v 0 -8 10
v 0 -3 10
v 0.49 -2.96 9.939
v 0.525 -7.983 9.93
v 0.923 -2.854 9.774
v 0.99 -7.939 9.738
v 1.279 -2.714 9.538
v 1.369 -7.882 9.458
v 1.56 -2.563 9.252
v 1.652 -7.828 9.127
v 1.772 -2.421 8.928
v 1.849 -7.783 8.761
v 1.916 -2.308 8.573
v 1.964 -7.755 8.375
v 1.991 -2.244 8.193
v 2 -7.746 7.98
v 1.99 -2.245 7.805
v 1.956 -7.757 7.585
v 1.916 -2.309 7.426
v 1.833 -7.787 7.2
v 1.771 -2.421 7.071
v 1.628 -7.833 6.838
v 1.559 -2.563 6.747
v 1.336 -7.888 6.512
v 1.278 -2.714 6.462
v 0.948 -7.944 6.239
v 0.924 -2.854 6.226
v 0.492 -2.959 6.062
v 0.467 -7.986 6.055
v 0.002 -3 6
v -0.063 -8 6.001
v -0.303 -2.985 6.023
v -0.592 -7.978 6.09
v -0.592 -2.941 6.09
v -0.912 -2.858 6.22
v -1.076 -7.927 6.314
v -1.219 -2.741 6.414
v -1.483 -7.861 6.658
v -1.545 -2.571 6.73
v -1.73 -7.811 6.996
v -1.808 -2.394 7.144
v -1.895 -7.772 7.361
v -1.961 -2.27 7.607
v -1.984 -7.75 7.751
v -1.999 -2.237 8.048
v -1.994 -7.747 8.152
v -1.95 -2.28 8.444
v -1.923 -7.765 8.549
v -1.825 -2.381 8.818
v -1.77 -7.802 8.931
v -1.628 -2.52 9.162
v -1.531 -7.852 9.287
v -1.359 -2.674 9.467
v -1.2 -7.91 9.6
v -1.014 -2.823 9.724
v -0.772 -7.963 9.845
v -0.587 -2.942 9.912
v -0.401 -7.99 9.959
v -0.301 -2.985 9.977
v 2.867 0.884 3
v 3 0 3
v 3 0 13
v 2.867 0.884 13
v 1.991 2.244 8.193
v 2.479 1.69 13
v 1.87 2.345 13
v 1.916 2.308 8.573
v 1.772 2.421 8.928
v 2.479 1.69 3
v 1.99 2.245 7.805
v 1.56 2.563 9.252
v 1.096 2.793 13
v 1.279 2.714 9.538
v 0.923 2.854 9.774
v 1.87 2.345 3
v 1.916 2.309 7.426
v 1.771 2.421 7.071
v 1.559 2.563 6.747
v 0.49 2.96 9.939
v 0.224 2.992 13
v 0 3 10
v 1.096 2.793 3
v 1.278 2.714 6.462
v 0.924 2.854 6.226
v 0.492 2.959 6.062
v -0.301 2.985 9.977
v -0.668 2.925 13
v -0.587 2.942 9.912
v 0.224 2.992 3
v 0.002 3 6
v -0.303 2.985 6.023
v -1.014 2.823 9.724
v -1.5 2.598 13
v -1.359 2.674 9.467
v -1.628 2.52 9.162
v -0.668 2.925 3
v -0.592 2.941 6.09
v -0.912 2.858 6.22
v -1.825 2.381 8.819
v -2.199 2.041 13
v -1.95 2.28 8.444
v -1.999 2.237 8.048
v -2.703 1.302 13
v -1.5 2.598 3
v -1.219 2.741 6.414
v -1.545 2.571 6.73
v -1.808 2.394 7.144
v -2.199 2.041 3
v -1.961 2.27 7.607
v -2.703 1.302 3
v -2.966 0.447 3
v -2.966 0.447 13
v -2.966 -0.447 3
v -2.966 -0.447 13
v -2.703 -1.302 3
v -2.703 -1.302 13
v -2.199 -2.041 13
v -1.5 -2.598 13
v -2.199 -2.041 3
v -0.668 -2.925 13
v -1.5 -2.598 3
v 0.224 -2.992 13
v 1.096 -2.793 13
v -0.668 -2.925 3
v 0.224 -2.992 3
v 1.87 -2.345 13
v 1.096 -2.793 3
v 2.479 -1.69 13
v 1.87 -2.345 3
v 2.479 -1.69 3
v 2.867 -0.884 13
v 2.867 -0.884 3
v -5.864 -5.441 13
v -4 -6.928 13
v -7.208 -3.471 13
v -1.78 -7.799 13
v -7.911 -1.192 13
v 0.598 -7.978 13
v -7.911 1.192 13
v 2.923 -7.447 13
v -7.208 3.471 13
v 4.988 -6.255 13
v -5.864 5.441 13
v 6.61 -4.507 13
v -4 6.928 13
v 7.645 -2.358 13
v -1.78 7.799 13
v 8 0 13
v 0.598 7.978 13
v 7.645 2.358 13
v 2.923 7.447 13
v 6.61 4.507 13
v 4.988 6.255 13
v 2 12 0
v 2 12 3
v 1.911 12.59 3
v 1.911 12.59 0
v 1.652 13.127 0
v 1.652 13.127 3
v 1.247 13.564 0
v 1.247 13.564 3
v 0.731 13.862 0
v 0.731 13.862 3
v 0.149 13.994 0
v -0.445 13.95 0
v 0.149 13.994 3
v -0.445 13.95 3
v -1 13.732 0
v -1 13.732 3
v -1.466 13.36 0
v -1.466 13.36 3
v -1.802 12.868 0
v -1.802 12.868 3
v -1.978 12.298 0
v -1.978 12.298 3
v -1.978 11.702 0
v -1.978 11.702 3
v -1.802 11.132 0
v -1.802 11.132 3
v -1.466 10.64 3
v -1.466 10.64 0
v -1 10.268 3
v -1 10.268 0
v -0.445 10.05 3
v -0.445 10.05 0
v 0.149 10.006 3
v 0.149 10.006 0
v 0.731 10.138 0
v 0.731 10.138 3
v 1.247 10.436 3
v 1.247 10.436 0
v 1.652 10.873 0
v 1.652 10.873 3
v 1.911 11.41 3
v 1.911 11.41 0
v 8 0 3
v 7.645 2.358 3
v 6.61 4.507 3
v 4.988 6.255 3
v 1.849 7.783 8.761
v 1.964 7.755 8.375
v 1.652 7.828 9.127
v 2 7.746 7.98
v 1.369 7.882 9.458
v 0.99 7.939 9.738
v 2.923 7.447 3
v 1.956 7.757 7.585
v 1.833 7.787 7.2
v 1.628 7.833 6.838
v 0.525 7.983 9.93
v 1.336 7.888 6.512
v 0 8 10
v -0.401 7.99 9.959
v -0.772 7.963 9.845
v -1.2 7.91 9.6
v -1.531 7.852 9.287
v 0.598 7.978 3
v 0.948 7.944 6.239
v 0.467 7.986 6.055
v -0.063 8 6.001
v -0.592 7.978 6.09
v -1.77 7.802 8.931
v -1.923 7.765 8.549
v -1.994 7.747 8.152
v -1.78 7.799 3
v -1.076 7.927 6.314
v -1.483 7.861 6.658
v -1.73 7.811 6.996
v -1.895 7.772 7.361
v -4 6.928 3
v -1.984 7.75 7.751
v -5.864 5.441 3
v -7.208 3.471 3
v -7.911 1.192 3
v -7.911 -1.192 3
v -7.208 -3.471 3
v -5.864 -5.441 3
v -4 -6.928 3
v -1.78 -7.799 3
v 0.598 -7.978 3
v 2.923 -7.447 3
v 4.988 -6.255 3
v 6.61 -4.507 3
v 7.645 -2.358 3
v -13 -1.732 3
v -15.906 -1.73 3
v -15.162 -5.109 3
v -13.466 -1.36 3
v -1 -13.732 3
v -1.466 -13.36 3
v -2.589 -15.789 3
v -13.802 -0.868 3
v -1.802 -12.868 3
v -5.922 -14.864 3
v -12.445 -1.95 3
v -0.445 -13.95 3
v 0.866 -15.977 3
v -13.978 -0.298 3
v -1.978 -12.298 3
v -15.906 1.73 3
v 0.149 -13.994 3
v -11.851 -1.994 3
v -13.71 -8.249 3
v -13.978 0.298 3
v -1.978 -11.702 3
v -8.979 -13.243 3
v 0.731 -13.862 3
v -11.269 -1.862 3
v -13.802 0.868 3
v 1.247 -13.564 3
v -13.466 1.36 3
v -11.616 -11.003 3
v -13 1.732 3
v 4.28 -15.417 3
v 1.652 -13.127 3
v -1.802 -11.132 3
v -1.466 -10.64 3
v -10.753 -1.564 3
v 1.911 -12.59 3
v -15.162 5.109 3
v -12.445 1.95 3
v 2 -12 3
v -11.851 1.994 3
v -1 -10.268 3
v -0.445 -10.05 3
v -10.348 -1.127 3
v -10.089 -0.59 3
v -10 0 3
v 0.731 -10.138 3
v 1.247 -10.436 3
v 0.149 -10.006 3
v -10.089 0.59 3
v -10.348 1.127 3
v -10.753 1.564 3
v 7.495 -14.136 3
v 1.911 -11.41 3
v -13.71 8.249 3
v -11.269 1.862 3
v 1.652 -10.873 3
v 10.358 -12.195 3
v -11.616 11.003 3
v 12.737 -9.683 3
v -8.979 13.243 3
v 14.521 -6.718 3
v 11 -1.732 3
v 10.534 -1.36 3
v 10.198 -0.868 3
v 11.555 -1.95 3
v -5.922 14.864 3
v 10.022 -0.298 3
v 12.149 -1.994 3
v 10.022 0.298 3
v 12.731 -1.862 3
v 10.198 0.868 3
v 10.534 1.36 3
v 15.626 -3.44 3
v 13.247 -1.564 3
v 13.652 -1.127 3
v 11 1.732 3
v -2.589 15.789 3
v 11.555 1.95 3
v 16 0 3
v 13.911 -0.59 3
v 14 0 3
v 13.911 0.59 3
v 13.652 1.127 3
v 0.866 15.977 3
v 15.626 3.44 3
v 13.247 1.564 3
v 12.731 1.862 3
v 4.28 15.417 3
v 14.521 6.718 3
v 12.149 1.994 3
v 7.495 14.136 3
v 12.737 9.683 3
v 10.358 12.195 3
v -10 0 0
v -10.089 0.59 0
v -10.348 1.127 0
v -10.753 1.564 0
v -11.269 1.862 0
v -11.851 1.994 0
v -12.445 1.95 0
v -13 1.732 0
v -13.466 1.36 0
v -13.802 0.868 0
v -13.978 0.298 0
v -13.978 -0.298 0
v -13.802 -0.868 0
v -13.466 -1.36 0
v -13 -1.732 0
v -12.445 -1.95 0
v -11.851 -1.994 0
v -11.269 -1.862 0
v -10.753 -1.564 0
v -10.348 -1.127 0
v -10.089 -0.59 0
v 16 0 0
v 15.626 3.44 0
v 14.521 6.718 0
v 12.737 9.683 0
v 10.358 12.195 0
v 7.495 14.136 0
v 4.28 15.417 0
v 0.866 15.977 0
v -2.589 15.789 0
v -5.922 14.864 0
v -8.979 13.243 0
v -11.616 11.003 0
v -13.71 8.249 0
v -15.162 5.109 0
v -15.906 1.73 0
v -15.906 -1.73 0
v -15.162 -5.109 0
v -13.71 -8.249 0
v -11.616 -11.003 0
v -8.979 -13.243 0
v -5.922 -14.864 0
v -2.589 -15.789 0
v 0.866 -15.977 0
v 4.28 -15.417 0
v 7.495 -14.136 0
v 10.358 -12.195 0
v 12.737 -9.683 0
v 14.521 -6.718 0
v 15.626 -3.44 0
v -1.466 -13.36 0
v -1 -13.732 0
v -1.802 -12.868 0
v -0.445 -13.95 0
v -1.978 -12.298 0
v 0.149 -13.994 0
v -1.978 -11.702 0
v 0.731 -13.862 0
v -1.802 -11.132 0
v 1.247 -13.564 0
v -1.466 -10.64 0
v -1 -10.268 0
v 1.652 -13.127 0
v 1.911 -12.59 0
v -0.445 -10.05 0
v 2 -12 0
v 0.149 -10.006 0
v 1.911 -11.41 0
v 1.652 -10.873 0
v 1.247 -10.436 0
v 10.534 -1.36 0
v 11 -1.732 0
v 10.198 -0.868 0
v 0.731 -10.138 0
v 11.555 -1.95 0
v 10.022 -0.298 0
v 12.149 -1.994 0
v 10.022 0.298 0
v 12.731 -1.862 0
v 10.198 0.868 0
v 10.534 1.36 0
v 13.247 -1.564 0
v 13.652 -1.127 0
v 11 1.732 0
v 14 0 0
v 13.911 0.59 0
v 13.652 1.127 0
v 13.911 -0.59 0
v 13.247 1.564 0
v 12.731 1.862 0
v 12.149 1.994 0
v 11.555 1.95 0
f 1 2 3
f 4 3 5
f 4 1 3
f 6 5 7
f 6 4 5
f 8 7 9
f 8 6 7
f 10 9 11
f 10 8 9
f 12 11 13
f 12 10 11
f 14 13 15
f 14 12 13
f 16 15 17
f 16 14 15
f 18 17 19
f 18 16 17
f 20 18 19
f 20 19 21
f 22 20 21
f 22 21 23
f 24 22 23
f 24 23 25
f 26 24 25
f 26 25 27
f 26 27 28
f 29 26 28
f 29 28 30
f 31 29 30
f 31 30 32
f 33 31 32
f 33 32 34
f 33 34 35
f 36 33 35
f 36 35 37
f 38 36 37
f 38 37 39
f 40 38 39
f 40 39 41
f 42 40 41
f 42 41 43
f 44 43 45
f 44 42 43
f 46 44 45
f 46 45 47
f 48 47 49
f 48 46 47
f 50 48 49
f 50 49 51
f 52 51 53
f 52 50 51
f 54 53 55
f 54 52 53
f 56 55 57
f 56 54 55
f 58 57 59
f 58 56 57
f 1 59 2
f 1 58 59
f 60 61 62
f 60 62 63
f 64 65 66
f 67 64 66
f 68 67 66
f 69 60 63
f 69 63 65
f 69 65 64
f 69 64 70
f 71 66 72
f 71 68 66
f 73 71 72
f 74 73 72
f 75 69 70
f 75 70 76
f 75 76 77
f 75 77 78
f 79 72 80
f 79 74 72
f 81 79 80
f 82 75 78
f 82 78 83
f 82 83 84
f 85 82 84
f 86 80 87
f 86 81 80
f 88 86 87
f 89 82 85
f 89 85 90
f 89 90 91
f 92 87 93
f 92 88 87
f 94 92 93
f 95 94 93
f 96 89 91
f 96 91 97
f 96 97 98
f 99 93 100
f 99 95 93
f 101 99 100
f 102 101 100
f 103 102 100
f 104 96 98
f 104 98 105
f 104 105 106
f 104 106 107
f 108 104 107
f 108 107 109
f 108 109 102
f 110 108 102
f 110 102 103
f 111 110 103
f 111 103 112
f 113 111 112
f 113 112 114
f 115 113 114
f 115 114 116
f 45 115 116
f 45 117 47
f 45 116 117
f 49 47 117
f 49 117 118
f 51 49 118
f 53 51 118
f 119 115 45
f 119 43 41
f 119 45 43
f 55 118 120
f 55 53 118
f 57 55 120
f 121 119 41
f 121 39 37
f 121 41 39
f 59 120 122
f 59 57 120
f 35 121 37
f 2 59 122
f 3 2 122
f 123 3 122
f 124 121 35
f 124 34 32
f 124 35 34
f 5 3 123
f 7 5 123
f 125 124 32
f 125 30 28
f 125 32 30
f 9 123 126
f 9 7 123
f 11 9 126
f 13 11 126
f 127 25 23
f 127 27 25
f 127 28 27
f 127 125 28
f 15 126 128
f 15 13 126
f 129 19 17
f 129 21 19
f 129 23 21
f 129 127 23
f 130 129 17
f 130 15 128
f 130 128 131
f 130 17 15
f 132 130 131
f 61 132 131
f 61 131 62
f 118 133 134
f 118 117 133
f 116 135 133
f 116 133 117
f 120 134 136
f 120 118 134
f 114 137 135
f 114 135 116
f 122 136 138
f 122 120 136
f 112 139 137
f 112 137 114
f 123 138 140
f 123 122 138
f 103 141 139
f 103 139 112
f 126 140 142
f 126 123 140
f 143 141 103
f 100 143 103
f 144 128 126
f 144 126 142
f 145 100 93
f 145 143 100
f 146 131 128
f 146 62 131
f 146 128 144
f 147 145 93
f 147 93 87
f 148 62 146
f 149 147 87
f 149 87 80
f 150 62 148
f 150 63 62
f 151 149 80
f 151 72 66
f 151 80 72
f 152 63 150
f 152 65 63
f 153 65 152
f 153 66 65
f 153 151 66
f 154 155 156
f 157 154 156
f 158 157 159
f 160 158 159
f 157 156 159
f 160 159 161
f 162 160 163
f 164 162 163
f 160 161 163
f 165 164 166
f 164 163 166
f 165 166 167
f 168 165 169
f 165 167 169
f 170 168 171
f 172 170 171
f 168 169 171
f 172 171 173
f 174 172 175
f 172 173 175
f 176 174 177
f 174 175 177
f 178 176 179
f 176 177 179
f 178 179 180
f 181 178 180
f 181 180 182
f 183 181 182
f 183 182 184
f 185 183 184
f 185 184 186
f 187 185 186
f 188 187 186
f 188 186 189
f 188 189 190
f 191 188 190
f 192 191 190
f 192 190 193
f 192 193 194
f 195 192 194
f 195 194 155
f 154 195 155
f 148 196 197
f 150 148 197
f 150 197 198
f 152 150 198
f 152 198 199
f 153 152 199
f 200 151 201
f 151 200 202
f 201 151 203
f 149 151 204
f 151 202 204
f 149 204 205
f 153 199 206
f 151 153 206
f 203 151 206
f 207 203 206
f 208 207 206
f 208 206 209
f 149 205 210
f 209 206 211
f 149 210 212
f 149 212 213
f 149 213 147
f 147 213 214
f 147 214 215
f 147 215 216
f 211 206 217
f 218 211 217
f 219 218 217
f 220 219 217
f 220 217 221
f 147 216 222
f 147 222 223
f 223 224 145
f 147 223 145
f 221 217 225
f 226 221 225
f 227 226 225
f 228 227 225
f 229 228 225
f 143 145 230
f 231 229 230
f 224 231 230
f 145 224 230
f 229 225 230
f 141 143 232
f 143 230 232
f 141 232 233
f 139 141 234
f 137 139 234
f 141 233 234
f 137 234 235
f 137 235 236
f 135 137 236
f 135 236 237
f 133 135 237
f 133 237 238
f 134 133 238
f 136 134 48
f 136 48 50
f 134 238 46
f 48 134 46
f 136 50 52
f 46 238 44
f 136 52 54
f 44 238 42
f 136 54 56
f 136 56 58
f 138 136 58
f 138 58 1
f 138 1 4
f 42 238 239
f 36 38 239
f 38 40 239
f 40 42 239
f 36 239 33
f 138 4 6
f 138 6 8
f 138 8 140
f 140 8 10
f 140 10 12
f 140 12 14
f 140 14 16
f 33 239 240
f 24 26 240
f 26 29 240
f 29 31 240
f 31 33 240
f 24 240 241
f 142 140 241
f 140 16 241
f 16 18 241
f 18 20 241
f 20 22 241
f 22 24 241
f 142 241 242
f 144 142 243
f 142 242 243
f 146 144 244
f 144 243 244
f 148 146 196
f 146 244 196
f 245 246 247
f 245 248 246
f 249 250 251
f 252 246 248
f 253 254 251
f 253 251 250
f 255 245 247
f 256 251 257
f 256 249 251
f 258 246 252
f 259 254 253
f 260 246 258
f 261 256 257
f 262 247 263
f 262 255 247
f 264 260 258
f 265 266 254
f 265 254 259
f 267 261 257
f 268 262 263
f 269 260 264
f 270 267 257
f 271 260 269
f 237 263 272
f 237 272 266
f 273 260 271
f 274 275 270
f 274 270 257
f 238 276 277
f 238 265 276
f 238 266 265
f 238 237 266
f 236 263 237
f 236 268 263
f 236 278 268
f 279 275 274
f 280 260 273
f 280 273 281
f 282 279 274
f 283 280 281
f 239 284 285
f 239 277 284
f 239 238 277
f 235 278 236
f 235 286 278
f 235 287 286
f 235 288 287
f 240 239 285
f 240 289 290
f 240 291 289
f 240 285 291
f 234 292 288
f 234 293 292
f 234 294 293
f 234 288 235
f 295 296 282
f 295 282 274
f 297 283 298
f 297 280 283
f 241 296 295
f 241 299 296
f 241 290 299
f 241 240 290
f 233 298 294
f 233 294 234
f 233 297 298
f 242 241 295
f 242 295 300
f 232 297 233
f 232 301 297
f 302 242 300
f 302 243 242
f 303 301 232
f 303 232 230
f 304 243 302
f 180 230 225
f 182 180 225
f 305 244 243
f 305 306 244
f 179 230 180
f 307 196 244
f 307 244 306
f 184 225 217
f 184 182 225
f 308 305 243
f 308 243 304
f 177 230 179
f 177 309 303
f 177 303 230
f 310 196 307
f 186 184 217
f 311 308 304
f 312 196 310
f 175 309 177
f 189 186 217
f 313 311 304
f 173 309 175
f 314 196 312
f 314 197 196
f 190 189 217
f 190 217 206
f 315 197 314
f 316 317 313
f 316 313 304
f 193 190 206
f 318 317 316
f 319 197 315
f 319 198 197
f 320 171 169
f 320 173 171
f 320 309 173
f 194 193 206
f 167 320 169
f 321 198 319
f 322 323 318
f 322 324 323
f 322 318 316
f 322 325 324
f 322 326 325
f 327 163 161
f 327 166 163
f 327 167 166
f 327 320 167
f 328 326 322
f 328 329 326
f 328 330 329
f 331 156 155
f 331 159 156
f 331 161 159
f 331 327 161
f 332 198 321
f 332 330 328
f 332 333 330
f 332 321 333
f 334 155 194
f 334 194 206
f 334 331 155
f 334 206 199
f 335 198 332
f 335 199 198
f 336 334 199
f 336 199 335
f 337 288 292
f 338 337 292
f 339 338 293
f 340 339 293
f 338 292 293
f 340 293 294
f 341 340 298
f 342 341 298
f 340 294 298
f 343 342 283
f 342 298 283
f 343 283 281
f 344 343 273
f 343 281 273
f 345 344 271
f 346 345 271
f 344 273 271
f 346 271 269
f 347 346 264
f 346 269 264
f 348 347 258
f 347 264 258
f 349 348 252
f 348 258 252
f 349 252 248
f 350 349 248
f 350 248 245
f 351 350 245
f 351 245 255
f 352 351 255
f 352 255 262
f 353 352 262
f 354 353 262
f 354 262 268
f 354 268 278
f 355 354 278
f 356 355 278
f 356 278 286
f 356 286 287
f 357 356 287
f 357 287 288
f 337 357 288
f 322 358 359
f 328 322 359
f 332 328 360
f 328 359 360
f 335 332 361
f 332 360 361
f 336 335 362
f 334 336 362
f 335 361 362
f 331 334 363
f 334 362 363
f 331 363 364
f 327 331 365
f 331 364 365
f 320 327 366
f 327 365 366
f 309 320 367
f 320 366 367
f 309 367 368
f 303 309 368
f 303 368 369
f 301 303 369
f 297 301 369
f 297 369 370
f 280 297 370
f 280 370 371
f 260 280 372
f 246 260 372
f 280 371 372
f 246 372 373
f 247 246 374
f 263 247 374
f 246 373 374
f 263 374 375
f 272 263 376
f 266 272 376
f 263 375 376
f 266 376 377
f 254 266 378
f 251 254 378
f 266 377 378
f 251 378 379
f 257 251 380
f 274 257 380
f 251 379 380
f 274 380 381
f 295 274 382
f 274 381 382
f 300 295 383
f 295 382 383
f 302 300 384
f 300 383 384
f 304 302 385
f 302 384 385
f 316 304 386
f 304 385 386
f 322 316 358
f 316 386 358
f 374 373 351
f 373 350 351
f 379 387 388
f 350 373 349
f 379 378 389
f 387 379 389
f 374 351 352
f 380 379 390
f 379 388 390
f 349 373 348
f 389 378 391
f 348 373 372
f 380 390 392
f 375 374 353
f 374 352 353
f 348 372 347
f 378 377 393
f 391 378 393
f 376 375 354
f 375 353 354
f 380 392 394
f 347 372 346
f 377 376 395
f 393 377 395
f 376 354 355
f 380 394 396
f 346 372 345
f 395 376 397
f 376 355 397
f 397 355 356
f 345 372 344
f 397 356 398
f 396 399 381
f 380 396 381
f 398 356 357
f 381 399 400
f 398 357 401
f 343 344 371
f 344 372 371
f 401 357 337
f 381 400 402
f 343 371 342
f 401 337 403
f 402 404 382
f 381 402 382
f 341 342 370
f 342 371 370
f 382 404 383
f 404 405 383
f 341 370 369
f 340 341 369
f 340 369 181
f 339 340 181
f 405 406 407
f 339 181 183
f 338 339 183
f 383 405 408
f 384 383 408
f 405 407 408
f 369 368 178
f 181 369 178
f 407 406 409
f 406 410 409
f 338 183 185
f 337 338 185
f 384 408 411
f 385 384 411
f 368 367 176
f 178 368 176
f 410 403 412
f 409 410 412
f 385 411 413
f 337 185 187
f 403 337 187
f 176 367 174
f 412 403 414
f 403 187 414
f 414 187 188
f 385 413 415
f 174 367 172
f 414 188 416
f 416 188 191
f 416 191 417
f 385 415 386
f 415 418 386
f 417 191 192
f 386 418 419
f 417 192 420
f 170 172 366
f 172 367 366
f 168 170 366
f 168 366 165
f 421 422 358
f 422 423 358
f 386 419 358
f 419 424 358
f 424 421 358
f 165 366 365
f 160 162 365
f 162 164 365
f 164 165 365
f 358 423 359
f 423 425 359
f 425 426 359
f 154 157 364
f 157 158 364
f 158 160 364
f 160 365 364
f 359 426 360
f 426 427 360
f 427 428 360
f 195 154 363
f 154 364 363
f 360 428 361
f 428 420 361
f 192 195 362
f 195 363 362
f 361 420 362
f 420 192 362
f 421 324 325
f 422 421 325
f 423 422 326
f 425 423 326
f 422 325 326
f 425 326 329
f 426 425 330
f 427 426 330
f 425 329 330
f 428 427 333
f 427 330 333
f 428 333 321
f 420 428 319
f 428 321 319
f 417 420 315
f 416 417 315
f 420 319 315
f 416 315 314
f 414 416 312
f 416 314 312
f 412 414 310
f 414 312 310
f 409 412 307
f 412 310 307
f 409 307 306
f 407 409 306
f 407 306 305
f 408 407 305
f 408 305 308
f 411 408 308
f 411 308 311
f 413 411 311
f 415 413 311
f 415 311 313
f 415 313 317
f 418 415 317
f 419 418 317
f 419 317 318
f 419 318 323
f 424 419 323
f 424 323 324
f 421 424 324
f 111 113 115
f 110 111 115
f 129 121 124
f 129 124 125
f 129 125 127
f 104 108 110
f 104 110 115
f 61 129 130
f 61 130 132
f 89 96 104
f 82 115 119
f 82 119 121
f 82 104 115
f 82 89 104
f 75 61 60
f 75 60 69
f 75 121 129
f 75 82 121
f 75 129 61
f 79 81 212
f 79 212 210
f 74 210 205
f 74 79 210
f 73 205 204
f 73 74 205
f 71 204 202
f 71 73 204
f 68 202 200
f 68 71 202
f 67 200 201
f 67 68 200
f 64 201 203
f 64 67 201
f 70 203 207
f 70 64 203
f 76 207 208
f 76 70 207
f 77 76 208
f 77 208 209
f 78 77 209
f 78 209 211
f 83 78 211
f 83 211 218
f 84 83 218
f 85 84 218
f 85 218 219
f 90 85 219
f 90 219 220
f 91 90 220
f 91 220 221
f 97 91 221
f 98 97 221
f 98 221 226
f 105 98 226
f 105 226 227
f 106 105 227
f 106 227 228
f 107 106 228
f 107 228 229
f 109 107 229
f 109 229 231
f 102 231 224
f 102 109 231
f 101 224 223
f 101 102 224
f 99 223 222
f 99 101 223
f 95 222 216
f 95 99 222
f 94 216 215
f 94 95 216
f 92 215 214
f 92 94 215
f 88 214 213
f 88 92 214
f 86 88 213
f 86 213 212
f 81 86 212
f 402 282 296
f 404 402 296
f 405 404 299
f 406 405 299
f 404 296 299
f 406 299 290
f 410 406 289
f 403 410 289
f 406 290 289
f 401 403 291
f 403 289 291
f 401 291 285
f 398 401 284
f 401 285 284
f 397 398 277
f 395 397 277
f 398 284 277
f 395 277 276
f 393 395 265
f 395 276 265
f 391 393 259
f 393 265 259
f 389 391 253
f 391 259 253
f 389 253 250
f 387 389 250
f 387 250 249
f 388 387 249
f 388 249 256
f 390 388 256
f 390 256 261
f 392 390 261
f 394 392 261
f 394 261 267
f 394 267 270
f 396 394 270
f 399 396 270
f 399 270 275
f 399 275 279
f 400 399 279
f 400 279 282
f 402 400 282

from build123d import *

# Parameters (mm, degrees)
SKETCH1_R               = 16
BOSS_EXTRUDE1_DEPTH     = 3
SKETCH2_R               = 8
SKETCH2_R_2             = 3
BOSS_EXTRUDE2_DEPTH     = 10
SKETCH3_R               = 2
CUT_EXTRUDE1_DEPTH      = 25.738633754
CUT_EXTRUDE2_DEPTH      = 27.095976701
CUT_EXTRUDE2_DEPTH_BACK = 27.095976701
SKETCH4_R               = 2


with BuildPart() as part:
    # Sketch1 → Boss-Extrude1 (new body)
    with BuildSketch(Plane.XY):
        Circle(SKETCH1_R)
    extrude(amount=BOSS_EXTRUDE1_DEPTH)

    # Sketch2 → Boss-Extrude2 (add)
    with BuildSketch(Plane.XY.offset(3)):
        Circle(SKETCH2_R)
        Circle(SKETCH2_R_2, mode=Mode.SUBTRACT)
    extrude(amount=BOSS_EXTRUDE2_DEPTH)

    # Sketch3 → Cut-Extrude1 (cut, through all)
    with BuildSketch(Plane.XY.offset(3)):
        with Locations((0, 12)):
            Circle(SKETCH3_R)
        with Locations((12, 0)):
            Circle(SKETCH3_R)
        with Locations((0, -12)):
            Circle(SKETCH3_R)
        with Locations((-12, 0)):
            Circle(SKETCH3_R)
    extrude(amount=-CUT_EXTRUDE1_DEPTH, mode=Mode.SUBTRACT)

    # Sketch4 → Cut-Extrude2 (cut, two sides: drawn at the far end of the back side and taken through both)
    with BuildSketch(Plane(origin=(0, 0, 0), x_dir=(1, 0, 0), z_dir=(0, 1, 0)).offset(-CUT_EXTRUDE2_DEPTH_BACK)):
        with Locations(Location((0, -8, 0), (0, 0, 270))):
            Circle(SKETCH4_R)
    extrude(amount=CUT_EXTRUDE2_DEPTH + CUT_EXTRUDE2_DEPTH_BACK, mode=Mode.SUBTRACT)


solid = part.part
